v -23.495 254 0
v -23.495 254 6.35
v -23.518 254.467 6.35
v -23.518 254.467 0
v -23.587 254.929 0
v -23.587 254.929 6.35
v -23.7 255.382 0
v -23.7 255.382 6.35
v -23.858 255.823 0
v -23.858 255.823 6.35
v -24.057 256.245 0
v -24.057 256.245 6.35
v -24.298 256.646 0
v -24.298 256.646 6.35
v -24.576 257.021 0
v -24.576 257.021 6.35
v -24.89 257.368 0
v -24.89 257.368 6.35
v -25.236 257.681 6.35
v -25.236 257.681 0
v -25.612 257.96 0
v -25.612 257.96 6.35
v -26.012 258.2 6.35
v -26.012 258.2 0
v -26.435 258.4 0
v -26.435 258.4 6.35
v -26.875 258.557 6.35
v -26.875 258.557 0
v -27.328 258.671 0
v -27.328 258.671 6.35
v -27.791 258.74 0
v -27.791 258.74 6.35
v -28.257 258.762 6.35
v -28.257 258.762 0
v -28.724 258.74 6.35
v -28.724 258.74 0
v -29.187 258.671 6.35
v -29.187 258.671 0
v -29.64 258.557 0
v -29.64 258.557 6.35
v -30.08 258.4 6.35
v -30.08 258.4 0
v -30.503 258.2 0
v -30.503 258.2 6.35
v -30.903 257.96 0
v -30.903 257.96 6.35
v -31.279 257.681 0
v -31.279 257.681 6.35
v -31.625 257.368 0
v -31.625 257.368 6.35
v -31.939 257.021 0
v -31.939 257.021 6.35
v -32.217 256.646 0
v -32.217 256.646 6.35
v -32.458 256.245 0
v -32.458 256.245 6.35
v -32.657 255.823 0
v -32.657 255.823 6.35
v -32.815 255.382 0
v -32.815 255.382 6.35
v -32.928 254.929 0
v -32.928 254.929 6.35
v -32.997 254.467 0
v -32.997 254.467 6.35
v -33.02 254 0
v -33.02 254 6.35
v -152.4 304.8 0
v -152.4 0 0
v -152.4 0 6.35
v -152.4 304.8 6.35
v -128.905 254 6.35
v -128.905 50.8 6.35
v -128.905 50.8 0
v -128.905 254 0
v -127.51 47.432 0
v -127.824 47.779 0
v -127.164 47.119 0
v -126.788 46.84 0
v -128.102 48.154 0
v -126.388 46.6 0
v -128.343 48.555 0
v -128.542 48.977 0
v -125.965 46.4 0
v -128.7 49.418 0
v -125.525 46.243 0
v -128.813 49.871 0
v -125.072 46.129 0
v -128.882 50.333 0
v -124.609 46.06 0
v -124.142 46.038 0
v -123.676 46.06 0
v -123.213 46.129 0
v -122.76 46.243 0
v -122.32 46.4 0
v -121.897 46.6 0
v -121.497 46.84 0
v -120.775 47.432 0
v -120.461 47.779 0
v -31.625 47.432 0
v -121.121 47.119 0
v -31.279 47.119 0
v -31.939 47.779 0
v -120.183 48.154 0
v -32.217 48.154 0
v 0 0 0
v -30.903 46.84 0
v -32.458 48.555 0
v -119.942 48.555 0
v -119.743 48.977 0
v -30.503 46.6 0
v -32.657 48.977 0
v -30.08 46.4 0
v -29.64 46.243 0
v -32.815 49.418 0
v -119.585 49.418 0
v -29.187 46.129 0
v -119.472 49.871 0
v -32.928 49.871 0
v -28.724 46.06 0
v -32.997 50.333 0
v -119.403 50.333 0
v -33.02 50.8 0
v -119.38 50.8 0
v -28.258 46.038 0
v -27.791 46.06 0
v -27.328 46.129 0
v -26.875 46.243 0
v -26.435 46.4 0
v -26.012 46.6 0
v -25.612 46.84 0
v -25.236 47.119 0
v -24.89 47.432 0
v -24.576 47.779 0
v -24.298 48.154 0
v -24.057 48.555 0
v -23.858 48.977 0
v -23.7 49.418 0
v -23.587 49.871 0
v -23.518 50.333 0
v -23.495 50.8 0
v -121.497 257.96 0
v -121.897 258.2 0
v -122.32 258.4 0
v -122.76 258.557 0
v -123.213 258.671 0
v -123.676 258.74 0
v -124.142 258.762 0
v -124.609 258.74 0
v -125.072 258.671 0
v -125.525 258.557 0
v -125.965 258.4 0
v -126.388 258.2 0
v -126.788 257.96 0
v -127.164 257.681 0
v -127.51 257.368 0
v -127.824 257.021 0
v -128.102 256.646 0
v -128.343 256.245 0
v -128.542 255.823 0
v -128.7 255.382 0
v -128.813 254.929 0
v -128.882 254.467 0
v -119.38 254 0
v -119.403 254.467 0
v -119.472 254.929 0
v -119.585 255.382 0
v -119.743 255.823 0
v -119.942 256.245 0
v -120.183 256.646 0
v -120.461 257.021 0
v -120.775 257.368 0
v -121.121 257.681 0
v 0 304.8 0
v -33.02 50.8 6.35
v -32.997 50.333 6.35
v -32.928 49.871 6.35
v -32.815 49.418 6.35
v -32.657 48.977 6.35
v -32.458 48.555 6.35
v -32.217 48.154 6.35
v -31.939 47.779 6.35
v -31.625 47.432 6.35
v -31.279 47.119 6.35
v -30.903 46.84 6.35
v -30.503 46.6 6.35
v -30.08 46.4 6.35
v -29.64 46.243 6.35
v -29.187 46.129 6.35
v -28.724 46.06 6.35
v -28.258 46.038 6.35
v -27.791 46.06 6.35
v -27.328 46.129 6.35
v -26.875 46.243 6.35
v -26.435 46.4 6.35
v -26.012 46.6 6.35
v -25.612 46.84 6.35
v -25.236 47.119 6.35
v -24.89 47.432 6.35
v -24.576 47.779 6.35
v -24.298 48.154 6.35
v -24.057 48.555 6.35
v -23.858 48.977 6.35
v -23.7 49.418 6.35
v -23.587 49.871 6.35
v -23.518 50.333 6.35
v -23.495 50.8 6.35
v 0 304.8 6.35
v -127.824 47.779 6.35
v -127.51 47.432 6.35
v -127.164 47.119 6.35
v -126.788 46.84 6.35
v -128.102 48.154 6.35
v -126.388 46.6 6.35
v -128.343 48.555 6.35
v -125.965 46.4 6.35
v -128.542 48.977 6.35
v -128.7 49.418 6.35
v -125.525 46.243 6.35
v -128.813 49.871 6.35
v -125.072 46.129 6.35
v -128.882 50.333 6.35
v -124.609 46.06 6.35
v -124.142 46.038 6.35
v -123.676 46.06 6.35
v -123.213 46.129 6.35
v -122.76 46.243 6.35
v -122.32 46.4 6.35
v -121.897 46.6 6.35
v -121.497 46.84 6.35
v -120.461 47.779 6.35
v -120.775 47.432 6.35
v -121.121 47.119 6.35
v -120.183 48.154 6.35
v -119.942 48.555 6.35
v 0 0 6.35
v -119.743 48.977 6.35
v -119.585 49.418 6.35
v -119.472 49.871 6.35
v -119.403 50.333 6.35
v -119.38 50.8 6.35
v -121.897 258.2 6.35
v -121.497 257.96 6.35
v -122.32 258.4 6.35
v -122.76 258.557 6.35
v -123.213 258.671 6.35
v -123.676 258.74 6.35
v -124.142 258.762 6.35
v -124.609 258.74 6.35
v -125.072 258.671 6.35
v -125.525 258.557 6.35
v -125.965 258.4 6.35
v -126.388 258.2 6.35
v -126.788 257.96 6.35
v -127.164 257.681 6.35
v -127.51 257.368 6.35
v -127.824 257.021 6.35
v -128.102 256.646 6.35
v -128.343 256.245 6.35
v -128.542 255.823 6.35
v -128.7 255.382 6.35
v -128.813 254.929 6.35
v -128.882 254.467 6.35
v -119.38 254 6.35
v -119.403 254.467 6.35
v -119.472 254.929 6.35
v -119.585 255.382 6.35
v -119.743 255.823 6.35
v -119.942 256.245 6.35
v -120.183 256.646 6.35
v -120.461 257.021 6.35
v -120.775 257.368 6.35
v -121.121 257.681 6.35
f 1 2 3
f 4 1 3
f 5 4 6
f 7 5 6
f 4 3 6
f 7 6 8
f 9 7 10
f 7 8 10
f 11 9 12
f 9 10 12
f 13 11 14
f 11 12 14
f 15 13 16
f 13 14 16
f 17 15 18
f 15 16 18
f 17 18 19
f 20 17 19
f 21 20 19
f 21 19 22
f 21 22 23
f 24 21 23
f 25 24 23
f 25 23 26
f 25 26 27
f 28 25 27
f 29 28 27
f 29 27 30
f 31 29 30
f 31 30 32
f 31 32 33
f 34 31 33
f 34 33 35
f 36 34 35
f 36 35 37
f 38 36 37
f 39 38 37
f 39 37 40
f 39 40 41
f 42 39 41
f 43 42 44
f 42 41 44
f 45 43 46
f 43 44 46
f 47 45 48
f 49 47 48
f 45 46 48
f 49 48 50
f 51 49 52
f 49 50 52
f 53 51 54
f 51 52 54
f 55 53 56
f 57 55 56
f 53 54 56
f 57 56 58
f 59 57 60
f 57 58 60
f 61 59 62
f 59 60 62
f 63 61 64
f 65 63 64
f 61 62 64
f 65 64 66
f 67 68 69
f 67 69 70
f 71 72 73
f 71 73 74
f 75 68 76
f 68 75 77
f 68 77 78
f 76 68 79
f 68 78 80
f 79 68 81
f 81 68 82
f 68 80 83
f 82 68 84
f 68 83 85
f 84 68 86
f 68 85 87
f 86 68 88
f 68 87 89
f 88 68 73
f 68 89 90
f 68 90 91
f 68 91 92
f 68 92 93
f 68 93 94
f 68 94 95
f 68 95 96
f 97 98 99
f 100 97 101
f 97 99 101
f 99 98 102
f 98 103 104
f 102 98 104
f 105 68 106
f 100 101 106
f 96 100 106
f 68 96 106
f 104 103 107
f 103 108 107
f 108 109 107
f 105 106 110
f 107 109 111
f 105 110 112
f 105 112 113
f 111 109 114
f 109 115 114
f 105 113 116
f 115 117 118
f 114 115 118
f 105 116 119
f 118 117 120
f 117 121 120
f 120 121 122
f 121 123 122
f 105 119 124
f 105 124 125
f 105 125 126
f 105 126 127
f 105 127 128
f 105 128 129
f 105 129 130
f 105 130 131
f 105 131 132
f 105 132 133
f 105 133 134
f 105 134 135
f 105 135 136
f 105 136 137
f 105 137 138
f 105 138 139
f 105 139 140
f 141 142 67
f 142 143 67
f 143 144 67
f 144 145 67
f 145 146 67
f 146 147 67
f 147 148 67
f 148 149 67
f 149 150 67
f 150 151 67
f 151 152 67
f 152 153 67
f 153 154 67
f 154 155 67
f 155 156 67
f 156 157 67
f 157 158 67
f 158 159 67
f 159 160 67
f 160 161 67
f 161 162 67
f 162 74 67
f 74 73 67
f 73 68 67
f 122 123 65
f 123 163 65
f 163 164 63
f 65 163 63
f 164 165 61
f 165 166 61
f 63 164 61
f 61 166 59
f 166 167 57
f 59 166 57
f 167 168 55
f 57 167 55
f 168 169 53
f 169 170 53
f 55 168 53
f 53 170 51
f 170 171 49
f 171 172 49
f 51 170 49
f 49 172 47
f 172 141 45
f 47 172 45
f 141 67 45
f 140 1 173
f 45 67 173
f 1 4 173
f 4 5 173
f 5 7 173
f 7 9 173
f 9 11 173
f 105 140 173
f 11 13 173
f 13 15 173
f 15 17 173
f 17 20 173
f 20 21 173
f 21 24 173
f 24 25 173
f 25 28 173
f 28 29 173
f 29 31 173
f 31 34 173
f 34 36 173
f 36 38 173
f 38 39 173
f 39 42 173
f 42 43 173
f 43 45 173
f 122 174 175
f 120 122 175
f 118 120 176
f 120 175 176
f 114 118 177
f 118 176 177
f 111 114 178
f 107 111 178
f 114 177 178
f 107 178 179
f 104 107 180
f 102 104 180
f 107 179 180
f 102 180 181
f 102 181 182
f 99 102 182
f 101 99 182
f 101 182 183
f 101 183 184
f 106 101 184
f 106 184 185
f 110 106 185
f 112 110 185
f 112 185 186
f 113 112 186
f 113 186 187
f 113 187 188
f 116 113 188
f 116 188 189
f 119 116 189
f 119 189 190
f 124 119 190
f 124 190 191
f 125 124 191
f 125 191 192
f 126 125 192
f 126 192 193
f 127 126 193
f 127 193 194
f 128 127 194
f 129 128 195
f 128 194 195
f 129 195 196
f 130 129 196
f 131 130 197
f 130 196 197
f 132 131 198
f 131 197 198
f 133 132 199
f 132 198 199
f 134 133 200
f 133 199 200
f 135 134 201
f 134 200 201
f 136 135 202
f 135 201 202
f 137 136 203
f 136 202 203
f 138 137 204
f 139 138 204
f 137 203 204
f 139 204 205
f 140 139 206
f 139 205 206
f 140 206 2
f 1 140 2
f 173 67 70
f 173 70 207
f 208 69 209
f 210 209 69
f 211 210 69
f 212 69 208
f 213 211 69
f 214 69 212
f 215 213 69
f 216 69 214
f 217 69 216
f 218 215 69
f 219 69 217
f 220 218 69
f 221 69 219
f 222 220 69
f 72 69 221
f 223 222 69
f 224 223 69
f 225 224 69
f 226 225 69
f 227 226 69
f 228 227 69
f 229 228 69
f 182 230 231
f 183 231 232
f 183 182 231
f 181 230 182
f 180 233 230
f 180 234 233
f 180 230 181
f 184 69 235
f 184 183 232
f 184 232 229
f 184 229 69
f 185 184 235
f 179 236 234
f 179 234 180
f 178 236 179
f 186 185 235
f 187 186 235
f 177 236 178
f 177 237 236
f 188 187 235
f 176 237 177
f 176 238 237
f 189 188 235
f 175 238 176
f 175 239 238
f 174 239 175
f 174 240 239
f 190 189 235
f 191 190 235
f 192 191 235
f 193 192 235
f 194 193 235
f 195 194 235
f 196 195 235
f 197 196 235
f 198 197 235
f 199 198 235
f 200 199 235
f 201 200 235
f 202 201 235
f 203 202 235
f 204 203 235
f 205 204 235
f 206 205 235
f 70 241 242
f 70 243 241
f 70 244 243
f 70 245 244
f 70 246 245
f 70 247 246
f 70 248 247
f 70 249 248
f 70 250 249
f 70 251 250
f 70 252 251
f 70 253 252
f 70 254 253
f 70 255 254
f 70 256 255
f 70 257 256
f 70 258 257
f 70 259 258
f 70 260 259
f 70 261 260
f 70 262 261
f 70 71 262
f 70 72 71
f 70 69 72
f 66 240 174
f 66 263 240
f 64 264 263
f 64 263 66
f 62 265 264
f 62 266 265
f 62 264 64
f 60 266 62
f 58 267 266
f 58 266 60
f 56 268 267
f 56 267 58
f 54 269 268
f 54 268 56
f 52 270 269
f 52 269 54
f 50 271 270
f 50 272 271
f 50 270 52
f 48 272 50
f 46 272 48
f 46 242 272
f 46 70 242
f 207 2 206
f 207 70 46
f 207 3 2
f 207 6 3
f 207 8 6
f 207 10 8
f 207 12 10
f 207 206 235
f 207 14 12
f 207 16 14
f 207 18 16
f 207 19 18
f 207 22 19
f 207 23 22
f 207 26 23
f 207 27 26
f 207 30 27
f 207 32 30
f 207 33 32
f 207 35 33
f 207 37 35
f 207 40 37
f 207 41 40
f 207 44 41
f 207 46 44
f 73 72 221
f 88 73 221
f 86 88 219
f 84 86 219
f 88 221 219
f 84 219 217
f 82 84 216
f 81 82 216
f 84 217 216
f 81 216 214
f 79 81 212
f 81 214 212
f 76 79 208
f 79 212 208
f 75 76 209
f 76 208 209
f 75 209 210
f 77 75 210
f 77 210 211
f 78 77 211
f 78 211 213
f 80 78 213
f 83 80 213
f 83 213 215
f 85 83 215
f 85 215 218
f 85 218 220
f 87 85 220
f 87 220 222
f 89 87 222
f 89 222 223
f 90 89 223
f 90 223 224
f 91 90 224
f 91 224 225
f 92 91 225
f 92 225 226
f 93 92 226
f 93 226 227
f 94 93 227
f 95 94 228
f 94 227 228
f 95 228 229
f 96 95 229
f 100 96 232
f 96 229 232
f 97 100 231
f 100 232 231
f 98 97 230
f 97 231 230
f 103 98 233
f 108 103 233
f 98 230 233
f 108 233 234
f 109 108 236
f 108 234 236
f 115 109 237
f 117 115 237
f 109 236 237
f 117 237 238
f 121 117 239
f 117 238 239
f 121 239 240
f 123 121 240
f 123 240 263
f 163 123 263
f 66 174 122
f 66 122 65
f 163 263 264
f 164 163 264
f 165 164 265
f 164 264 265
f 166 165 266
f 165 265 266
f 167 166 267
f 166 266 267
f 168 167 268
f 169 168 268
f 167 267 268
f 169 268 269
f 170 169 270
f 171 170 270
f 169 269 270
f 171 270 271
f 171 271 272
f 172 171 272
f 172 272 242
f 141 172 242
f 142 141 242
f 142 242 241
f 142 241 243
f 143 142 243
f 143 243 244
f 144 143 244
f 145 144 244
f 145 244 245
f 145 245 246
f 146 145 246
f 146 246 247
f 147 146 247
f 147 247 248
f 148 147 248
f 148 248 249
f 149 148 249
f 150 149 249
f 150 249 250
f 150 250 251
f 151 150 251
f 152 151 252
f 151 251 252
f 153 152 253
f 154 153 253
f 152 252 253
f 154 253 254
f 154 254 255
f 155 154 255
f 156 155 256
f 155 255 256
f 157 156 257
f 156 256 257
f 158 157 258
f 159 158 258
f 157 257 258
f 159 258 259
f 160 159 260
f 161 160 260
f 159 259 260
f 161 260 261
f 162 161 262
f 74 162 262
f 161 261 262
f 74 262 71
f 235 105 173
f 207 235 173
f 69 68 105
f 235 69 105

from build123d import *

# Parameters (mm, degrees)
F0_W     = 152.4
F0_H     = 304.8
F1_DEPTH = 6.35
F2_W     = 9.525
F2_H     = 203.2
F3_DEPTH = 25.4


with BuildPart() as f1:
    # F0 (on Top) → F1 (new body)
    with BuildSketch(Plane.XY):
        with Locations((-76.2, 152.4)):
            Rectangle(F0_W, F0_H)
    extrude(amount=F1_DEPTH)

    # F2 (on face) → F3 (cut)
    with BuildSketch(Plane.XY.offset(6.35)):
        with BuildLine():
            ThreePointArc((-119.38, 254), (-124.1425, 258.7625), (-128.905, 254))
            Line((-128.905, 254), (-119.38, 254))
        make_face()
        with Locations((-124.1425, 152.4)):
            Rectangle(F2_W, F2_H)
        with BuildLine():
            Line((-119.38, 50.8), (-128.905, 50.8))
            ThreePointArc((-128.905, 50.8), (-124.1425, 46.0375), (-119.38, 50.8))
        make_face()
        with BuildLine():
            ThreePointArc((-23.495, 254), (-28.2575, 258.7625), (-33.02, 254))
            Line((-33.02, 254), (-23.495, 254))
        make_face()
        with Locations((-28.2575, 152.4)):
            Rectangle(F2_W, F2_H)
        with BuildLine():
            Line((-23.495, 50.8), (-33.02, 50.8))
            ThreePointArc((-33.02, 50.8), (-28.2575, 46.0375), (-23.495, 50.8))
        make_face()
    extrude(amount=-F3_DEPTH, mode=Mode.SUBTRACT)


solid = f1.part
